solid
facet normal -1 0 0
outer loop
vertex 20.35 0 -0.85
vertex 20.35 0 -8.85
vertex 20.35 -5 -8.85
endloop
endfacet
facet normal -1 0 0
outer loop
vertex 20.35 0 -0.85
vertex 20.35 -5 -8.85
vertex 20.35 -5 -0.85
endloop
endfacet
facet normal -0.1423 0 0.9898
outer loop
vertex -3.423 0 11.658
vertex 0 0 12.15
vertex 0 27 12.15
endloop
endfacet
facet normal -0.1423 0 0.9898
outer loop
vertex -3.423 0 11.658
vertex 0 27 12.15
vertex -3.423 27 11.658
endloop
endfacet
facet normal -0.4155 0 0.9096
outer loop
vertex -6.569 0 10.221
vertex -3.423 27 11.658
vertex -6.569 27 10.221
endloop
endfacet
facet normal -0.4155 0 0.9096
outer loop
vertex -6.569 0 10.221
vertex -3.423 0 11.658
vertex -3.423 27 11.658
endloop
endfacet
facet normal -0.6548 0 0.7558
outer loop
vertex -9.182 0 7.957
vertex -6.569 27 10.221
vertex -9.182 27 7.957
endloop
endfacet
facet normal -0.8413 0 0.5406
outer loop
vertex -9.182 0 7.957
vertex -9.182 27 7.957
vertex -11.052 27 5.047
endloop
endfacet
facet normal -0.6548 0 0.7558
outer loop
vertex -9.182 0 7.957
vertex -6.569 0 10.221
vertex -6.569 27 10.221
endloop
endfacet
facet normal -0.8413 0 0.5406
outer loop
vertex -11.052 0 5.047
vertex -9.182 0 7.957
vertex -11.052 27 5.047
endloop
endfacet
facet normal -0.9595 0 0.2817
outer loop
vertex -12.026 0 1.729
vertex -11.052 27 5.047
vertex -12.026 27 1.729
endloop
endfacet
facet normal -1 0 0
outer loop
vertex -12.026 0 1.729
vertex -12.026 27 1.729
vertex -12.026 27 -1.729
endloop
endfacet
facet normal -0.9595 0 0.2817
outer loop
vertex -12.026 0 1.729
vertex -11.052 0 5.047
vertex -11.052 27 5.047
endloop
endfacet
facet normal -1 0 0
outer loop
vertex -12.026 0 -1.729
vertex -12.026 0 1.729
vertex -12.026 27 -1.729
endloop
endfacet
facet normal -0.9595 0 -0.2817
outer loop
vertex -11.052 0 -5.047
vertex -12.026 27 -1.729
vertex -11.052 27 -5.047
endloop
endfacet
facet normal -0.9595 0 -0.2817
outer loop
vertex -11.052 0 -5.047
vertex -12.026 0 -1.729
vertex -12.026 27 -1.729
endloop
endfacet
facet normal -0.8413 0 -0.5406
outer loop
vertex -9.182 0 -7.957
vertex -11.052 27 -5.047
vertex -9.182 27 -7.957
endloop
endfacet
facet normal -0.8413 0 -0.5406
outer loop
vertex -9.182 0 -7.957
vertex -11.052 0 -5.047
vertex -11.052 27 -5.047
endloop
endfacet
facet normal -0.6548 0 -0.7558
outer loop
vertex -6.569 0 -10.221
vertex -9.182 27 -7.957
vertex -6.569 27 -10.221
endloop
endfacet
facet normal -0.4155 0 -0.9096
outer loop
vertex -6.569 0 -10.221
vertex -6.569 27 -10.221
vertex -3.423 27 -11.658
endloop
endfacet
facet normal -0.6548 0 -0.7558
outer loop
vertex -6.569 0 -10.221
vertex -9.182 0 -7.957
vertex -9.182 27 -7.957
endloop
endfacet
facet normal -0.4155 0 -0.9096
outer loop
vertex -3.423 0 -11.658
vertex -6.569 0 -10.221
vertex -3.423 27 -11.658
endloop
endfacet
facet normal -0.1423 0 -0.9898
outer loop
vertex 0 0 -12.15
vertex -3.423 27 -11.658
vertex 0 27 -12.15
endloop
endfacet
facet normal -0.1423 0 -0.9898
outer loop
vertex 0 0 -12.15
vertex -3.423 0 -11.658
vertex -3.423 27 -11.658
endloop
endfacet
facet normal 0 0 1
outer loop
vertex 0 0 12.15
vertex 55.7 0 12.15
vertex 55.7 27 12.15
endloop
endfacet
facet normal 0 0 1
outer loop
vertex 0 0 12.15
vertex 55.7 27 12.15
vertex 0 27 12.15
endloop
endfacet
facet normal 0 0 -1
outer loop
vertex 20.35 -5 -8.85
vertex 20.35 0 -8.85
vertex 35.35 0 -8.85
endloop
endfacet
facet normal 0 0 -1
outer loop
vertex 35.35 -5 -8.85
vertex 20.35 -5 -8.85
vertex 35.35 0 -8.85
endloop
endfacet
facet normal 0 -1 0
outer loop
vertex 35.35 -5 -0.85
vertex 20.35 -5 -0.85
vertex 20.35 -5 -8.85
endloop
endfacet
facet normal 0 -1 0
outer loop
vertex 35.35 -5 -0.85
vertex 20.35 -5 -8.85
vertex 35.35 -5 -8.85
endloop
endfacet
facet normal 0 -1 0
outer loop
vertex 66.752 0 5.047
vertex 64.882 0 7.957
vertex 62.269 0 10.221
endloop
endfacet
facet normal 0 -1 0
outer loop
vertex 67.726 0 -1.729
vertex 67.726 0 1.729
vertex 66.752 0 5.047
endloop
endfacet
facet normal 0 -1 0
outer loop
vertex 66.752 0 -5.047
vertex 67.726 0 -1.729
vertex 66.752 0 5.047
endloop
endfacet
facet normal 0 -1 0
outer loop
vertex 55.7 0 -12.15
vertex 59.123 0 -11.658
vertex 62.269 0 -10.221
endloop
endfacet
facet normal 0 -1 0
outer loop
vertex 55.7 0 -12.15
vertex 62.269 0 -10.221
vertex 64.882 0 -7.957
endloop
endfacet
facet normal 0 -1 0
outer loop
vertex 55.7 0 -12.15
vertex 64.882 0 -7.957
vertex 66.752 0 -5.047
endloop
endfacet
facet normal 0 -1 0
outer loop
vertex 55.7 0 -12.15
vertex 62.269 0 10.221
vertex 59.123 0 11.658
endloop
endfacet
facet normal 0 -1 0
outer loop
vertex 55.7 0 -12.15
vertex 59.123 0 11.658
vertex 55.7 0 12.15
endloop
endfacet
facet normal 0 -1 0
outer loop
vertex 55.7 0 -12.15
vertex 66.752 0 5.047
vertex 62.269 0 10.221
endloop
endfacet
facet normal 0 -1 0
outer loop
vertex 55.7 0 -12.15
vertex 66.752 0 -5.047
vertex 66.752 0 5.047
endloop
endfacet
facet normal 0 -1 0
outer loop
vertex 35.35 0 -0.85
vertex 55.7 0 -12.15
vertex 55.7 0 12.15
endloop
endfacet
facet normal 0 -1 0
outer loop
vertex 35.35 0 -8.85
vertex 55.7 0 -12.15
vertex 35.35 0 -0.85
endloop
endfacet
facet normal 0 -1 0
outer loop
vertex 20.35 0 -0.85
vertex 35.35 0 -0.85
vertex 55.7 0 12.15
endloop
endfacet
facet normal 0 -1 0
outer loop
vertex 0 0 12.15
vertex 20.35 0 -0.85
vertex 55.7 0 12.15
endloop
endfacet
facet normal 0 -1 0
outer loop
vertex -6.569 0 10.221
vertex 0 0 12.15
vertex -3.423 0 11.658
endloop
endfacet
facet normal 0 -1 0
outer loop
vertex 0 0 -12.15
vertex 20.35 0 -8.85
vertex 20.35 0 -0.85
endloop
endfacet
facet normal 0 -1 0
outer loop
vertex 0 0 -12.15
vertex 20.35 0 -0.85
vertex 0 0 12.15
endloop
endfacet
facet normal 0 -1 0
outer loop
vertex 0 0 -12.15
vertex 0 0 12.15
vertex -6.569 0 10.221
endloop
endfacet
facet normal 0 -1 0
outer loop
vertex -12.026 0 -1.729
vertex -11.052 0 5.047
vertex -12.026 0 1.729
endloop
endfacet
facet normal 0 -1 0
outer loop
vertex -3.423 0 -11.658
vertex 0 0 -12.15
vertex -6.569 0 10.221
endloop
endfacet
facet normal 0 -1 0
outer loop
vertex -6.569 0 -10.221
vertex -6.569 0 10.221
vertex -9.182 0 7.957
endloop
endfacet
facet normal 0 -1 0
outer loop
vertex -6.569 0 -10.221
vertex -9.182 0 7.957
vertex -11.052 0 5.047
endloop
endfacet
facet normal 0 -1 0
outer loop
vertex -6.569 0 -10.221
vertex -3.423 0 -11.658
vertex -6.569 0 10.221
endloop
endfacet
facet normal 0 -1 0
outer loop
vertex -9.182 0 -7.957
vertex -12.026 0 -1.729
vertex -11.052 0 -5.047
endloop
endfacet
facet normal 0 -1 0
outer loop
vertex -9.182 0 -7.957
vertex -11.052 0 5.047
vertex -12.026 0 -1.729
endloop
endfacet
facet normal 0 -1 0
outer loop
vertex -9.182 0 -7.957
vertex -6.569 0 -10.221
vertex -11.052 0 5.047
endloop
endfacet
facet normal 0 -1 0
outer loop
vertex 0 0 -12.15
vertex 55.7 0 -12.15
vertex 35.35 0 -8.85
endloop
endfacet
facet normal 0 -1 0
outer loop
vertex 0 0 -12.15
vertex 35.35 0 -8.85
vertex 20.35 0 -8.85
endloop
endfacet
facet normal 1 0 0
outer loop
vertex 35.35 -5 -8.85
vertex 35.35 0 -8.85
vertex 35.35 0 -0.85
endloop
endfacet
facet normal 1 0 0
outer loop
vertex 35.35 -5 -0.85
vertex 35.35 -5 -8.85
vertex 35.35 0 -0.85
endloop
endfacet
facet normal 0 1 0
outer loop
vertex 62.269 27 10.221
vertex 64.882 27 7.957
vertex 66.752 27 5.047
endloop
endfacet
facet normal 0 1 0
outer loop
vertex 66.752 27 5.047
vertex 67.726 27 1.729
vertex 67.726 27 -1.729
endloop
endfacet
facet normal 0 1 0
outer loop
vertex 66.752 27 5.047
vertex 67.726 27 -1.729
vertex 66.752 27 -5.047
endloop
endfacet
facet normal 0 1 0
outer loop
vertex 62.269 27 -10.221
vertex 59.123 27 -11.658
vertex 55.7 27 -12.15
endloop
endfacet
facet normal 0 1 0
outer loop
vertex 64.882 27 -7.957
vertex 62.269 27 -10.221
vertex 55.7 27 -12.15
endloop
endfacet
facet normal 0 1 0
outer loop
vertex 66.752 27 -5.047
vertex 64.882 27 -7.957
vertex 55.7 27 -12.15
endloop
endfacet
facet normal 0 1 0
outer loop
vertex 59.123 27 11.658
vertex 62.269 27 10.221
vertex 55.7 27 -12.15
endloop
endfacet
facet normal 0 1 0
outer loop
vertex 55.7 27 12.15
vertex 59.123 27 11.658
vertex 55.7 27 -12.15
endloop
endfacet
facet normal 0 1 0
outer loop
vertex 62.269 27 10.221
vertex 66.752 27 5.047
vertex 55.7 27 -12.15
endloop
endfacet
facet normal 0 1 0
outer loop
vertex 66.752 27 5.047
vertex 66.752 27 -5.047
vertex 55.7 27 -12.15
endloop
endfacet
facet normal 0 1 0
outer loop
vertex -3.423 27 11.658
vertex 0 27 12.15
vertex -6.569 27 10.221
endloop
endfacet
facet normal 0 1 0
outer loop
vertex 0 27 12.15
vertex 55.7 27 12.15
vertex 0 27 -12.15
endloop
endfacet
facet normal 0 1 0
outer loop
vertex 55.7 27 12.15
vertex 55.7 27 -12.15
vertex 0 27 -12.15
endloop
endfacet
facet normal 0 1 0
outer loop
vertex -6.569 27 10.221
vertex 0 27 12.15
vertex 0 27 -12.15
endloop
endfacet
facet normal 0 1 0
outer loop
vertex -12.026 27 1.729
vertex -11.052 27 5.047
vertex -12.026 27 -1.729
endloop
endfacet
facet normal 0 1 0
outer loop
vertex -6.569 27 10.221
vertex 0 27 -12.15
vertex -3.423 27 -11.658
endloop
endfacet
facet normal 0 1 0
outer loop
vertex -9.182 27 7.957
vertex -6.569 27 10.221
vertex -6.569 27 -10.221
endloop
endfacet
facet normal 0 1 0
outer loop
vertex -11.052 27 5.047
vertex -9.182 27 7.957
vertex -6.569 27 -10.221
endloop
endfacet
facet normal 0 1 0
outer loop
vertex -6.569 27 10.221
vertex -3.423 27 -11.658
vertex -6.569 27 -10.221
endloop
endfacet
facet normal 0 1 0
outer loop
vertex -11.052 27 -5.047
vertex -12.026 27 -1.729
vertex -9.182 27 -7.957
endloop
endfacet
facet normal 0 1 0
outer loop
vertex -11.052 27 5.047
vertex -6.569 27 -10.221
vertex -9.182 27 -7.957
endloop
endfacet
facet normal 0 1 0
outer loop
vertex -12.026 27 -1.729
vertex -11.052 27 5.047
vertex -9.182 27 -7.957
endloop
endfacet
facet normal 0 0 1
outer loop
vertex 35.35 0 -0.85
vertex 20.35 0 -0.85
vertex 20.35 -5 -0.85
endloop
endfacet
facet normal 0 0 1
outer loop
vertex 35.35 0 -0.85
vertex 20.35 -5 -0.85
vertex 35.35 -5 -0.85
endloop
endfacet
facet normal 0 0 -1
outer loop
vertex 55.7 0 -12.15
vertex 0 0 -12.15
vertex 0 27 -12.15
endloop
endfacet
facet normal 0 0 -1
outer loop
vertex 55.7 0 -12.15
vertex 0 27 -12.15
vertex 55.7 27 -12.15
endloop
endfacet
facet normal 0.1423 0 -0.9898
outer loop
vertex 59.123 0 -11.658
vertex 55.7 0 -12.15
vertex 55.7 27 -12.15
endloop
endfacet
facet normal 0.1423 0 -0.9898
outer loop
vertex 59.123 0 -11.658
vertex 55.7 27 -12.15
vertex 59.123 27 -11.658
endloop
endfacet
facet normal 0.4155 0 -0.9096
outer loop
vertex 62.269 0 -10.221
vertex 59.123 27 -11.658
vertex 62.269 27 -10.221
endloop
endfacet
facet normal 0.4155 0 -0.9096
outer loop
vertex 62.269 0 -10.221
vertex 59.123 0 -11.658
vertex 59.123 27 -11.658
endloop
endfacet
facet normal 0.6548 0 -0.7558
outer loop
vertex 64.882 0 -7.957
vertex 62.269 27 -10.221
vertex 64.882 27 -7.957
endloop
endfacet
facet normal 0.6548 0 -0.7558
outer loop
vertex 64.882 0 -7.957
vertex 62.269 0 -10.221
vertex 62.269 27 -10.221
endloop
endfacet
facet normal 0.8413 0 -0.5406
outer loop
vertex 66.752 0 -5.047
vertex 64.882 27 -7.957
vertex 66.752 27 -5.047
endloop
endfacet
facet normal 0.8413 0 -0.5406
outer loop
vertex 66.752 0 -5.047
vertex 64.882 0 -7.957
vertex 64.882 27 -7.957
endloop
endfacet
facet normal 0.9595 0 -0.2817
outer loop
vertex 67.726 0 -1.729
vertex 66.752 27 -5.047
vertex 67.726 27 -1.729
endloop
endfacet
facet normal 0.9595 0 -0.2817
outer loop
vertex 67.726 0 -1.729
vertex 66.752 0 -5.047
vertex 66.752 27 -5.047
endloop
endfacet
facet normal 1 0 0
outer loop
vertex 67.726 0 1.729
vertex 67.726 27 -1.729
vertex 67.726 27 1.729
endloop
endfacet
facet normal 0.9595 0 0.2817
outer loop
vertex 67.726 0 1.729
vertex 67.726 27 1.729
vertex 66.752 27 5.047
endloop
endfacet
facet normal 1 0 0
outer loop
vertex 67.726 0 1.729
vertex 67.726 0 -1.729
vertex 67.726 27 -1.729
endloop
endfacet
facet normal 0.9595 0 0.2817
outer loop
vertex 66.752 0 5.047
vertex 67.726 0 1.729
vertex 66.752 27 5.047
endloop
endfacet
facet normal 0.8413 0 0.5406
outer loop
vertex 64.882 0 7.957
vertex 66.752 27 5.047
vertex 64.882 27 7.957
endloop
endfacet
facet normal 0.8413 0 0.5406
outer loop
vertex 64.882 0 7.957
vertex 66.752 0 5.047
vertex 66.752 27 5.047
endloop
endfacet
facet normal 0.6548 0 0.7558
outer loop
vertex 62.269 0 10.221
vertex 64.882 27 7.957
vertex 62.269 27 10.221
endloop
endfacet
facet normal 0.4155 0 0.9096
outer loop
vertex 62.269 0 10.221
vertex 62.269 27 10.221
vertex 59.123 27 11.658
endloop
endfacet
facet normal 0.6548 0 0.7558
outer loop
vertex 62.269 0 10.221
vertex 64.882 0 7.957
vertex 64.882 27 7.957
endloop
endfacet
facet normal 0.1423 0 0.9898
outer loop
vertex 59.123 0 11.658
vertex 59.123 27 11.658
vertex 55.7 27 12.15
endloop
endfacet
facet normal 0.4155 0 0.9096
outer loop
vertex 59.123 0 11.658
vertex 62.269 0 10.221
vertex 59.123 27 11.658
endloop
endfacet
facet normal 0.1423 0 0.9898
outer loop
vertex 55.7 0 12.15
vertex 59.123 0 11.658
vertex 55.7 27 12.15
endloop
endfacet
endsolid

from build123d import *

# Parameters (mm, degrees)
EXTRUDE_1_DEPTH = 27
SKETCH_2_W      = 15
SKETCH_2_H      = 8
EXTRUDE_2_DEPTH = 5


with BuildPart() as part:
    # 草图1 → 凸台-拉伸1 (new body)
    with BuildSketch(Plane(origin=(0, 0, 0), x_dir=(1, 0, 0), z_dir=(0, 1, 0))):
        with BuildLine():
            Line((0, 12.15), (55.7, 12.15))
            ThreePointArc((55.7, 12.15), (67.85, 0), (55.7, -12.15))
            Line((55.7, -12.15), (0, -12.15))
            ThreePointArc((0, -12.15), (-12.15, 0), (0, 12.15))
        make_face()
    extrude(amount=EXTRUDE_1_DEPTH)

    # 草图2 → 凸台-拉伸2 (add)
    with BuildSketch(Plane.XZ):
        with Locations((27.85, -4.85)):
            Rectangle(SKETCH_2_W, SKETCH_2_H)
    extrude(amount=EXTRUDE_2_DEPTH)


solid = part.part
